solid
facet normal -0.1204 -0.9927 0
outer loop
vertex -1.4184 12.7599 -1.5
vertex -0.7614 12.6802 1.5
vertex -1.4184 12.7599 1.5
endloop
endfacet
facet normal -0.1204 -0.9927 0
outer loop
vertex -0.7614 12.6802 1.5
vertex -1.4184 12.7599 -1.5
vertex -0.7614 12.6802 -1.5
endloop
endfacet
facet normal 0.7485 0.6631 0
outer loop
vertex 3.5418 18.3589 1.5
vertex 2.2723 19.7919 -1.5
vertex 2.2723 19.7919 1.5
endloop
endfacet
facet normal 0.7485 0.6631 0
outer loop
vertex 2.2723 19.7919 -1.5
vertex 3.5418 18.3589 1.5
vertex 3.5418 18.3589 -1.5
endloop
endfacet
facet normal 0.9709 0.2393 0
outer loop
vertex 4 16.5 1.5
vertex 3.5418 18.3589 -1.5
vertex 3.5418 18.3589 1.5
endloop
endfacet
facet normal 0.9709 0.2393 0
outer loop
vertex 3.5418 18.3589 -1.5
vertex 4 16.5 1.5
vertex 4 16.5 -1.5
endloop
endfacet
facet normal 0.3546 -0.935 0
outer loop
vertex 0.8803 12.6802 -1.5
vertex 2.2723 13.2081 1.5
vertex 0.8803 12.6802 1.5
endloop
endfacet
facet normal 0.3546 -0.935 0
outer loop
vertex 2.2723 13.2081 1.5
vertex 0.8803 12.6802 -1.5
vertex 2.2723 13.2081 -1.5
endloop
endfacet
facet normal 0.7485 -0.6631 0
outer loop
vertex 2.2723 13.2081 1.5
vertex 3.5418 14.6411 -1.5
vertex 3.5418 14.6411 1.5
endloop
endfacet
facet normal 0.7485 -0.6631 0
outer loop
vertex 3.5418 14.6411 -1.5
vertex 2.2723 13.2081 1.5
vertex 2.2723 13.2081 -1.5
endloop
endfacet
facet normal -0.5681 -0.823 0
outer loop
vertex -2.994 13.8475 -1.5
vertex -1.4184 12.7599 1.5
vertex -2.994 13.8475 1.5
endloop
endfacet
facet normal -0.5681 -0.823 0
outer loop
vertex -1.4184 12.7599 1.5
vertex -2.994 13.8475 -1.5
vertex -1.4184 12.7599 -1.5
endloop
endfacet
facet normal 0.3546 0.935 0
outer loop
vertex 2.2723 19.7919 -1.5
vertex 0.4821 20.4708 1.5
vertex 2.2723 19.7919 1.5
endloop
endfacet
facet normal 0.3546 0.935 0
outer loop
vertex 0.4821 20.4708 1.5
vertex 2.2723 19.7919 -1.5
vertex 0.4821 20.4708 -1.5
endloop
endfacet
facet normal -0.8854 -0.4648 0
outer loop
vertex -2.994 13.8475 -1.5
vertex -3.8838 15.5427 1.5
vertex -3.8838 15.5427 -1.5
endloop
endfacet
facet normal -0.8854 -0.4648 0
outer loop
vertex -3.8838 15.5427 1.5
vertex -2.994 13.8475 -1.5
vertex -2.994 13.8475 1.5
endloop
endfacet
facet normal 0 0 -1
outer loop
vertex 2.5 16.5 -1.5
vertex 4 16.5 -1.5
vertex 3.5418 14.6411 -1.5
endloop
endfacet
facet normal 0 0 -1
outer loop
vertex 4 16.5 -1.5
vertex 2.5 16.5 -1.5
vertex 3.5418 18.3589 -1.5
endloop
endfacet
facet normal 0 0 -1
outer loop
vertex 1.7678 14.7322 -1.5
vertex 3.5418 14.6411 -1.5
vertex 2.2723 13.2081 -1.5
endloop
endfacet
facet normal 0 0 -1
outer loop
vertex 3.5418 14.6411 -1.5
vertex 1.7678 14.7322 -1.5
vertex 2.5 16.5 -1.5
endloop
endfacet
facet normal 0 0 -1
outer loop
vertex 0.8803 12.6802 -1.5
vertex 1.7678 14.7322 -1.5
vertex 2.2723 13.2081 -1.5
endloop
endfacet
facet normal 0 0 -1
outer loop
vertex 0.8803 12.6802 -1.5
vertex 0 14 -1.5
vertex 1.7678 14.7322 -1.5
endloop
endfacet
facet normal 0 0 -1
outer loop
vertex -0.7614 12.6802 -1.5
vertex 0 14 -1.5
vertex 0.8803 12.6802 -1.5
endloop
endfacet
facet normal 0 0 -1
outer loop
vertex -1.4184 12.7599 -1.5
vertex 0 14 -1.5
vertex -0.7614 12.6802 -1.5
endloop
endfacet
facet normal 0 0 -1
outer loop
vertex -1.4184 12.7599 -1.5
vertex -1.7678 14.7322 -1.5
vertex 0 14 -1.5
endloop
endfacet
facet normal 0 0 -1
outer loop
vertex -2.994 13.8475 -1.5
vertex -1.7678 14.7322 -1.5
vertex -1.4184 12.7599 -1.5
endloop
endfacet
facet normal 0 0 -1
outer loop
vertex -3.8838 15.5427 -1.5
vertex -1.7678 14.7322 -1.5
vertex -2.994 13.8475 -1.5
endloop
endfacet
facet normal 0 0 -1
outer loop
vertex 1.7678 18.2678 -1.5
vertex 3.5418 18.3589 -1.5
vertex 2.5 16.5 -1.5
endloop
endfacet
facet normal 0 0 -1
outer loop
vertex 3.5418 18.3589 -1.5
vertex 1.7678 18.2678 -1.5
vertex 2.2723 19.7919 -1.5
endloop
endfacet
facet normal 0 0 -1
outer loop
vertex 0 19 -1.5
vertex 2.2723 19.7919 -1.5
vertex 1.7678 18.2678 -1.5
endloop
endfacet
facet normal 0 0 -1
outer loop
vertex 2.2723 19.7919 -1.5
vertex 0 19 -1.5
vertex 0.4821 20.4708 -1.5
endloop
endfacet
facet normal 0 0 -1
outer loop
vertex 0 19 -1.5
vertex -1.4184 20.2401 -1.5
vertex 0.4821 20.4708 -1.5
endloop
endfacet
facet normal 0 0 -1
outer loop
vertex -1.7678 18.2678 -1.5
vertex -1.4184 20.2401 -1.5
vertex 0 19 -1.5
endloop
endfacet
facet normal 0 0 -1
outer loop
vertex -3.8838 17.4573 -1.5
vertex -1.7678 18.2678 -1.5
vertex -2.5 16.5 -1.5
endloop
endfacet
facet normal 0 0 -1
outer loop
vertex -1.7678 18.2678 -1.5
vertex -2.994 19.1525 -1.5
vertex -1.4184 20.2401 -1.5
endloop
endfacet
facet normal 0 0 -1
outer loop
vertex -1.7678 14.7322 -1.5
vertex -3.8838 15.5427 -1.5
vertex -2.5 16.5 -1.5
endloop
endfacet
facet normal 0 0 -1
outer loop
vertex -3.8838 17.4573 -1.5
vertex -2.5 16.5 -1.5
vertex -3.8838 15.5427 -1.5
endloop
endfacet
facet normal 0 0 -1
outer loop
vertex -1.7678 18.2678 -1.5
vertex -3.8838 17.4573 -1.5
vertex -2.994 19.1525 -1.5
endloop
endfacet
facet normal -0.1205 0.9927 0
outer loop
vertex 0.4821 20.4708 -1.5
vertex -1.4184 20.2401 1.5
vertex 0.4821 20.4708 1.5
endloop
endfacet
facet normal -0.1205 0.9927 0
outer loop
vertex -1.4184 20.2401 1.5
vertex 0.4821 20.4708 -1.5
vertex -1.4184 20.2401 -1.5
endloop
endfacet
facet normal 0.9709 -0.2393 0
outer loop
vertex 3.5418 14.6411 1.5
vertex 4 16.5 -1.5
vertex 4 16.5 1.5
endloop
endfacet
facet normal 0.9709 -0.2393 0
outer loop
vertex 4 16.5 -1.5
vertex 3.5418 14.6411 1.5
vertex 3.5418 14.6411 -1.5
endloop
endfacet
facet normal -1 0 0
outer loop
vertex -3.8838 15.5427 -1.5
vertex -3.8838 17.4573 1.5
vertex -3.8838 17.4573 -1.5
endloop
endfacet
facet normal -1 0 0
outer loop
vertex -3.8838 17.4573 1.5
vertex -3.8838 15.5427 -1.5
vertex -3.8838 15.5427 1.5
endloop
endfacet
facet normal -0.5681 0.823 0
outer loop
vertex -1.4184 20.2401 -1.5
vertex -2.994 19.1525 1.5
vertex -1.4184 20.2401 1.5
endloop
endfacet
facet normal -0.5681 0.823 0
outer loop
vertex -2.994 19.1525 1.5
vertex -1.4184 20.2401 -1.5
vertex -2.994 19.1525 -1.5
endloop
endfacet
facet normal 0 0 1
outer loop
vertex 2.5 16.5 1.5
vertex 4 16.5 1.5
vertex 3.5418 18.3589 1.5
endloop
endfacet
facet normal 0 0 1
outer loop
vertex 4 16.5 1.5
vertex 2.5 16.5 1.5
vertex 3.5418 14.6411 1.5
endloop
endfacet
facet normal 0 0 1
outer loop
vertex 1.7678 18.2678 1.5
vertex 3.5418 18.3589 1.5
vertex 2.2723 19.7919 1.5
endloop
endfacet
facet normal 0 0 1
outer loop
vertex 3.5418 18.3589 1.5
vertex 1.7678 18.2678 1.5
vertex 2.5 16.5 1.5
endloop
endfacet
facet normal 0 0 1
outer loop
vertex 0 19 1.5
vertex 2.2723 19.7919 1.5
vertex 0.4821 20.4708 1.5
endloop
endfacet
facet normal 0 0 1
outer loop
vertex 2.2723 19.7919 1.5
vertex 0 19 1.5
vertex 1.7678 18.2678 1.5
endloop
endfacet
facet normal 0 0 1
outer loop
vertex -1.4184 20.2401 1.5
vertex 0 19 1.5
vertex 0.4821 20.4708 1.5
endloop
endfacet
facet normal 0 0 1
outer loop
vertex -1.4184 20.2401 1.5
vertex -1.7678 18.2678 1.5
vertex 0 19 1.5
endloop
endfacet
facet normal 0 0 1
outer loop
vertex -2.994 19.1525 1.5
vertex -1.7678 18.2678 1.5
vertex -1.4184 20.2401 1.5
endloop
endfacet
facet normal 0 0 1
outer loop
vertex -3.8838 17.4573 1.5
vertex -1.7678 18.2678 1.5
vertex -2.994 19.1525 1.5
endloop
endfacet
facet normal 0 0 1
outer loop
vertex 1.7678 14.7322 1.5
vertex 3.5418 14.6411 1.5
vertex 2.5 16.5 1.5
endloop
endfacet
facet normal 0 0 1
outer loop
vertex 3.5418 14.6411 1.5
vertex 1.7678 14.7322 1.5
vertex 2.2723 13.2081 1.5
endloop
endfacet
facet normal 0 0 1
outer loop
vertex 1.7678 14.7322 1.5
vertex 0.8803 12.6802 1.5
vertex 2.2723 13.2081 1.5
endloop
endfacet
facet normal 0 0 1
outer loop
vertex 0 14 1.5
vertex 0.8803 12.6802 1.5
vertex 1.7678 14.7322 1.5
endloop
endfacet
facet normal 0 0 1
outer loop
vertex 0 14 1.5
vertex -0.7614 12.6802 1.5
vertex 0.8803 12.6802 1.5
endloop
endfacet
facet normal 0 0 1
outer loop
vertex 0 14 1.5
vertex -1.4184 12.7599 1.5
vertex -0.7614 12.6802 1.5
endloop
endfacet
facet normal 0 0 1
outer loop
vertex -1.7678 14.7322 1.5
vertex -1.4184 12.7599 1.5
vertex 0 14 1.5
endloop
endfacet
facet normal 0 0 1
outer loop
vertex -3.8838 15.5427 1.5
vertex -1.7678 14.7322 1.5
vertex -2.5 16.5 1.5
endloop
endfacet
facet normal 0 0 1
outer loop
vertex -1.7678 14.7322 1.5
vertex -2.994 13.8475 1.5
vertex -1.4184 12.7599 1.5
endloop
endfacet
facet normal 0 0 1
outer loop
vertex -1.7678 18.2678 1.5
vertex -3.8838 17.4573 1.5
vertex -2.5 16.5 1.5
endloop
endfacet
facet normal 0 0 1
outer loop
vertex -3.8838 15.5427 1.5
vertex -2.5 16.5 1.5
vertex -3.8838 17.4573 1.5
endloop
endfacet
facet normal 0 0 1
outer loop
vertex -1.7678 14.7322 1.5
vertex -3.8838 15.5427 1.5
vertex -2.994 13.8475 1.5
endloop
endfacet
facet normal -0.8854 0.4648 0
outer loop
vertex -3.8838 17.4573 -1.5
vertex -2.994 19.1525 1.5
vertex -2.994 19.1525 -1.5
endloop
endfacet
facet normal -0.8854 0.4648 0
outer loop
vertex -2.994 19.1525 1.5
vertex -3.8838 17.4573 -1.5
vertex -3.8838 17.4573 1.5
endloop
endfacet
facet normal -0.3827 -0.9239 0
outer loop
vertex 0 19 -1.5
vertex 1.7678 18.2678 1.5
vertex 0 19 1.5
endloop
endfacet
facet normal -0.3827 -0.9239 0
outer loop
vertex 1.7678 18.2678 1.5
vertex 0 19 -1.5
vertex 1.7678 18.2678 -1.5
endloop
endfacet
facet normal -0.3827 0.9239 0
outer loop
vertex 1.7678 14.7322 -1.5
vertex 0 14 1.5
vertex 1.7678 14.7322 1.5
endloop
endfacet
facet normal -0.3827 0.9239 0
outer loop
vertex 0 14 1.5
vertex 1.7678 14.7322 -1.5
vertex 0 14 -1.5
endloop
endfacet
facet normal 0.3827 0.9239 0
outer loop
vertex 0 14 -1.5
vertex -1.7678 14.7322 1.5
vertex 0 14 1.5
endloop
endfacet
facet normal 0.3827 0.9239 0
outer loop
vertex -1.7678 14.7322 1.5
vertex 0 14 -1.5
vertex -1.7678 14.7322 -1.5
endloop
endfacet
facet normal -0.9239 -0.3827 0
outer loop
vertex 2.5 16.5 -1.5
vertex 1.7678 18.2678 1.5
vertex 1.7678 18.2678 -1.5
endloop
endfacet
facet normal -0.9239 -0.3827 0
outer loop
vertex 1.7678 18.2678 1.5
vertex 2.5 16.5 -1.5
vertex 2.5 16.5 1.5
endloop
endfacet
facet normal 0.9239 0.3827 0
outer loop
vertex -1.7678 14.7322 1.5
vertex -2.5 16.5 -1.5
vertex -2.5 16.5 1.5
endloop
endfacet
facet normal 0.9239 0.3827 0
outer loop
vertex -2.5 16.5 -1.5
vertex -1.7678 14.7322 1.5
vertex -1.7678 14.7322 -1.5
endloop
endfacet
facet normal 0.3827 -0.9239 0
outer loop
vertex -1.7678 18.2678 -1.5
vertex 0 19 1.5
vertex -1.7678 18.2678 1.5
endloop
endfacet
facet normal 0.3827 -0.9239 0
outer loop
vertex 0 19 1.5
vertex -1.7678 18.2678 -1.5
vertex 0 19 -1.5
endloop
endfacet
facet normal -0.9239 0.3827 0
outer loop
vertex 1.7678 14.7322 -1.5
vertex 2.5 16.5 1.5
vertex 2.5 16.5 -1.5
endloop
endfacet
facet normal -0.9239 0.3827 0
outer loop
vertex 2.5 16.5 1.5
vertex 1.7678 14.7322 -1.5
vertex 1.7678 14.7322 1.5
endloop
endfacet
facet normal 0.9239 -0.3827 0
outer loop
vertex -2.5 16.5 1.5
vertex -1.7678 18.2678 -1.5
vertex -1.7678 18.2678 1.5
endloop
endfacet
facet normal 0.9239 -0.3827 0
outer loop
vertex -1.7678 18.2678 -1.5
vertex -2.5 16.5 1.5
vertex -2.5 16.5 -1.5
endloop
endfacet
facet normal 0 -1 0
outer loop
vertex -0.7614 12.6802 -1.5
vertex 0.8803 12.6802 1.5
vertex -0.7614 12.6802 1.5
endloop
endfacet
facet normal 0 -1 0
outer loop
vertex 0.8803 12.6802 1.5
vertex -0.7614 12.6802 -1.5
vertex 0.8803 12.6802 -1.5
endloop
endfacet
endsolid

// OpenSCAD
//! Keychain Mount for attachment of rings or chains.

difference() {
    // First make a cylinder.

    // Move the panel up the y-axis by 16.5mm so that this is on the top outer edge of the main body.
    translate([0, 16.5, 0])

    // Extrude the panel up 3mm.
    // Center being true effectively extrudes half the height in both directions from the middle of that height.
    linear_extrude(height = 3, center = true)

    // Draw a circle with a diameter of 8mm.
    circle(d = 8);

    // The semi colon above ends this object, which is just the body.
    // All following objects will remove from the above object instead of drawing more new objects.

    // Next hollow out the cylinder.

    // Move the panel up the y-axis by 16.5mm so that this is on the top outer edge of the main body.
    // Same area as the above cylinder.
    translate([0, 16.5, 0])

    // Extrude the panel up 3mm.
    // Any number greater than the height of the above object can be used.
    // A number exactly the same as 3mm may leave a 0 width surface that will confuse object slicers for 3D printing.
    // Center being true effectively extrudes half the height in both directions from the middle of that height.
    linear_extrude(height = 6, center = true)

    // Draw a circle with a diameter of 5mm so that the keychain mount has a solid thickness of 3mm for strength.
    circle(d = 5);

    // Next remove any part of the mount that overlaps with the main ring body.

    // Extrude the panel up 3mm.
    // Any number greater than the height of the above object can be used.
    // A number exactly the same as 3mm may leave a 0 width surface that will confuse object slicers for 3D printing.
    // Center being true effectively extrudes half the height in both directions from the middle of that height.
    linear_extrude(height = 6, center = true)

    // Draw a circle with the inner diameter of the main ring body.
    // This keeps the main inner area clear.
    circle(d = 25.5);
}
